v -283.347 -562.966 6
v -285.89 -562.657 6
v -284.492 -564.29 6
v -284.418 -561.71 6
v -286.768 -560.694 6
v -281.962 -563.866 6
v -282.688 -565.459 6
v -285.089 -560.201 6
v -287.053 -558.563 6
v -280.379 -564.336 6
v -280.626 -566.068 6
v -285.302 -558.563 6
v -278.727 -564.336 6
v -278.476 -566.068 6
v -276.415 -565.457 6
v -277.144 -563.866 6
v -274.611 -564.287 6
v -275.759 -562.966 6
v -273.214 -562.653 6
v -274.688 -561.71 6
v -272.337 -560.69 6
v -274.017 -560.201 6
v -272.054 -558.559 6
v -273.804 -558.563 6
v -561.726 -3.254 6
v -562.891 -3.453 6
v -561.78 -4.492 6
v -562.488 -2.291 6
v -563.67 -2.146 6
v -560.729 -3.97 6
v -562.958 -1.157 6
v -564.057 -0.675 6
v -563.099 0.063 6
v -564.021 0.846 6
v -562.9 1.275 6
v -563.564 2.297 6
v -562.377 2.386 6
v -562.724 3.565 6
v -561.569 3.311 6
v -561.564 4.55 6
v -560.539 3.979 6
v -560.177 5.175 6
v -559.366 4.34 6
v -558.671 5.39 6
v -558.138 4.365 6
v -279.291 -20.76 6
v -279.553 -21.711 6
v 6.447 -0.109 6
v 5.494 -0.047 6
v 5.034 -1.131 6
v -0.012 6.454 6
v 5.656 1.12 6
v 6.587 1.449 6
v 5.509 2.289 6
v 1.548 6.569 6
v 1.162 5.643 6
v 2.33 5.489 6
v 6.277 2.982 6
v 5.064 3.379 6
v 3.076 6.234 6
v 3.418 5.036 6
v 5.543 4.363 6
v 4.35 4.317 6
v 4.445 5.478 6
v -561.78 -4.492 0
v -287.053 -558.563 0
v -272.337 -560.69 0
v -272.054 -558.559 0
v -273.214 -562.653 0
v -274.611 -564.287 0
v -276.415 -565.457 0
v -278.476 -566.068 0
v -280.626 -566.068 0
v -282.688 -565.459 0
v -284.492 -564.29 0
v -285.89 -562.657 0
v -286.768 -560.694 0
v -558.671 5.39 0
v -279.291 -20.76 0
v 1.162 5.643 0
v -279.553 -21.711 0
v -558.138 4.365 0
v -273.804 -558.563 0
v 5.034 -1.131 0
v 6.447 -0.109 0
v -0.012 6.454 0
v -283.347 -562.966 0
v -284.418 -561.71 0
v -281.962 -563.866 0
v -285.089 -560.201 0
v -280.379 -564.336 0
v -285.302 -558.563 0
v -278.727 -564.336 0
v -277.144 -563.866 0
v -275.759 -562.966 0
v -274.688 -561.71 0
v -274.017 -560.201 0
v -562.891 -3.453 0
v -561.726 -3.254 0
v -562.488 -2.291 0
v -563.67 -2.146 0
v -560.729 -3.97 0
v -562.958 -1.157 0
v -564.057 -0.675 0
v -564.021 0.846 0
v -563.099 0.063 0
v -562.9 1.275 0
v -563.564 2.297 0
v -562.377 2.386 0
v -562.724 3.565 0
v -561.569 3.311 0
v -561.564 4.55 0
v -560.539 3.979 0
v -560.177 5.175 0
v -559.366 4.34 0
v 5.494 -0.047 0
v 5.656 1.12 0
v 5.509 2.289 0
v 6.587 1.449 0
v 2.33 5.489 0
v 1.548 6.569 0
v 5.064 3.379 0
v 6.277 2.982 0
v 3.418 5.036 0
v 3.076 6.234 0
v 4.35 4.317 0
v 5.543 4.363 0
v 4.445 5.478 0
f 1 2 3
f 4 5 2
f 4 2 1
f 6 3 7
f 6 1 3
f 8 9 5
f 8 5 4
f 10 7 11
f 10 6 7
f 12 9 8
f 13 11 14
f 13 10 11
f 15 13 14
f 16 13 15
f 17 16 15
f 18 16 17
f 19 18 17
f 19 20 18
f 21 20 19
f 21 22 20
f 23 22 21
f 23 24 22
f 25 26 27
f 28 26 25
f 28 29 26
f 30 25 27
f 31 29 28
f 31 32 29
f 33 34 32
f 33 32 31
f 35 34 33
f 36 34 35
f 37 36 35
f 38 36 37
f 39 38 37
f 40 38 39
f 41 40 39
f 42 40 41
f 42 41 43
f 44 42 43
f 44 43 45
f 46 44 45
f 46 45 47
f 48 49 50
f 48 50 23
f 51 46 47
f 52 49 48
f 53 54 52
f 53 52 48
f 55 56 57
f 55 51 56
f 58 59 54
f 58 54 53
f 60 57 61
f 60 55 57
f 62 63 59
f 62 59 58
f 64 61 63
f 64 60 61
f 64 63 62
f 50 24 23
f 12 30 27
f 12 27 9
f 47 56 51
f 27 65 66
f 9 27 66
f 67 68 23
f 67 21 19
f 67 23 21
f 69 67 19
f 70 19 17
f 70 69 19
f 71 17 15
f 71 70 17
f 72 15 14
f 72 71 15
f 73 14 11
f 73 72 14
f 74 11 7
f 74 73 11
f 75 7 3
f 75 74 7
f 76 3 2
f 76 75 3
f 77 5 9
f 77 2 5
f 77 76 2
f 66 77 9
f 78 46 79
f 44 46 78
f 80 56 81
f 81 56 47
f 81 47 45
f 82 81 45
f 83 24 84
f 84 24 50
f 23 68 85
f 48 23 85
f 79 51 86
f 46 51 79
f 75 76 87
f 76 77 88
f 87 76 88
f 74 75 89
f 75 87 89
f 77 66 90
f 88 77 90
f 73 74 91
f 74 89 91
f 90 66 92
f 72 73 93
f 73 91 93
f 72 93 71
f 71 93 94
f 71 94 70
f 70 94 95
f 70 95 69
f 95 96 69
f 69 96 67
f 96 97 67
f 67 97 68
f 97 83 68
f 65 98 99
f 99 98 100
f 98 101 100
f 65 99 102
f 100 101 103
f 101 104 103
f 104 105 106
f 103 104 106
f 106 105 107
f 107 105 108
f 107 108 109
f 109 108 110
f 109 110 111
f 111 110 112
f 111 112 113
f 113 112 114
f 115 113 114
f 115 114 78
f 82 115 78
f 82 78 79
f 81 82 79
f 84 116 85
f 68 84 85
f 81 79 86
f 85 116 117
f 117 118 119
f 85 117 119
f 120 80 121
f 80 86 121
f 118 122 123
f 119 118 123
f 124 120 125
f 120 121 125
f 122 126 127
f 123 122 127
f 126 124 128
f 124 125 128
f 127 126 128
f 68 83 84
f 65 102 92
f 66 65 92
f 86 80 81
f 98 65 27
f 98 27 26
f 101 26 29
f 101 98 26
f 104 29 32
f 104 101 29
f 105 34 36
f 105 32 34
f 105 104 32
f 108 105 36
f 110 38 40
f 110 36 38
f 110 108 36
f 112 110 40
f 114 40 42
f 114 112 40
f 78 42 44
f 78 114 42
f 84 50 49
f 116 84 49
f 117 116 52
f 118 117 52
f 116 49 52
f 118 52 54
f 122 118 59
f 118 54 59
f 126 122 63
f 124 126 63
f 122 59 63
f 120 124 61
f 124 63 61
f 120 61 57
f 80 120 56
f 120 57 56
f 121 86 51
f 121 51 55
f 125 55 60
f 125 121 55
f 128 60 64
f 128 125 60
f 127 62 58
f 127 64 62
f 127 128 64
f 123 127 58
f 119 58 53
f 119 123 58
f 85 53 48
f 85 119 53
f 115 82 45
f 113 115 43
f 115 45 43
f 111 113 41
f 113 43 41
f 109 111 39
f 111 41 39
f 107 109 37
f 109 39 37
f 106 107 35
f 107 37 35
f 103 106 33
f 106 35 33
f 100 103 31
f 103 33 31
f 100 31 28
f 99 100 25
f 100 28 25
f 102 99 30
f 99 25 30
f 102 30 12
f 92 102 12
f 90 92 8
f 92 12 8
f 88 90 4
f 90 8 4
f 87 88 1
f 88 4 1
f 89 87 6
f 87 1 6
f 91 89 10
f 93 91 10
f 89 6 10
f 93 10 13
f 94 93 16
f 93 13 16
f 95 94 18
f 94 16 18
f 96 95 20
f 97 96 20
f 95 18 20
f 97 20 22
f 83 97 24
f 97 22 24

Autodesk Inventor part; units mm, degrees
ref_plane "YZ Plane" through (0, 0, 0) normal (1, 0, 0) x (0, 1, 0)
ref_plane "XZ Plane" through (0, 0, 0) normal (0, 1, 0) x (-1, 0, 0)
ref_plane "XY Plane" through (0, 0, 0) normal (0, 0, 1) x (1, 0, 0)
sketch "Sketch1" plane through (0, 0, 0) normal (0, 0, 1) x (1, 0, 0)
  arc A0 (-287.0527, -558.563) -> (-272.0536, -558.5587) centre (-279.5531, -558.6452) ccw
  line L0 (-561.7795, -4.4916) -> (-287.0527, -558.563)
  line L1 (-272.0536, -558.5587) -> (6.4474, -0.1094)
  line L2 (-0.0123, 6.4539) -> (-558.6713, 5.3904)
  arc A1 (-558.6713, 5.3904) -> (-561.7795, -4.4916) centre (-558.6609, -0.0427) ccw
  arc A2 (6.4474, -0.1094) -> (-0.0123, 6.4539) centre (1.1622, 1.1493) ccw
  point P0 (0, 0)
  dimension "d0" = 5.433
extrude "Extrusion1" add sketch "Sketch1" along normal blind 6
sketch "Sketch3" plane through (0, 0, 6) normal (0, 0, 1) x (1, 0, 0)
  line L0 (-561.7795, -4.4916) -> (-287.0527, -558.563) projected
  arc A0 (-287.0527, -558.563) -> (-272.0536, -558.5587) centre (-279.5531, -558.6452) ccw projected
  line L1 (-272.0536, -558.5587) -> (6.4474, -0.1094) projected
  arc A1 (6.4474, -0.1094) -> (-0.0123, 6.4539) centre (1.1622, 1.1493) ccw projected
  line L2 (-0.0123, 6.4539) -> (-558.6713, 5.3904) projected
  arc A2 (-558.6713, 5.3904) -> (-561.7795, -4.4916) centre (-558.6609, -0.0427) ccw projected
  line L3 (-0.0123, 6.4539) -> (-279.291, -20.76)
  line L4 (-0.0123, 6.4539) -> (-558.6713, 5.3904) projected
  line L5 (-279.291, -20.76) -> (-558.6713, 5.3904)
  line L6 (-558.6713, 5.3904) -> (-279.551, 142.5192)
  line L7 (-279.551, 142.5192) -> (-0.0123, 6.4539)
  point P0 (0, 0)
extrude "Extrusion2" cut sketch "Sketch3" against normal blind 6 contours L6 L7 L2 | L2 L3 L5
sketch "Sketch4" plane through (0, 0, 6) normal (0, 0, 1) x (1, 0, 0)
  point P0 (0, 0)
sketch "Sketch5" plane through (0, 0, 6) normal (0, 0, 1) x (1, 0, 0)
  line L0 (-0.0123, 6.4539) -> (-279.291, -20.76) projected
  line L1 (-279.291, -20.76) -> (-558.6713, 5.3904) projected
  arc A0 (-558.6713, 5.3904) -> (-561.7795, -4.4916) centre (-558.6609, -0.0427) ccw projected
  line L2 (-561.7795, -4.4916) -> (-287.0527, -558.563) projected
  arc A1 (-287.0527, -558.563) -> (-272.0536, -558.5587) centre (-279.5531, -558.6452) ccw projected
  line L3 (-272.0536, -558.5587) -> (6.4474, -0.1094) projected
  arc A2 (6.4474, -0.1094) -> (-0.0123, 6.4539) centre (1.1622, 1.1493) ccw projected
  arc A3 (-285.3025, -558.563) -> (-273.8037, -558.563) centre (-279.5531, -558.6452) ccw
  arc A4 (5.0344, -1.1313) -> (0.2947, 5.5587) centre (1.1622, 1.1493) ccw
  arc A5 (-558.1379, 4.3653) -> (-560.7286, -3.9705) centre (-558.6609, -0.0427) ccw
  line L4 (-560.7286, -3.9705) -> (-285.3025, -558.563)
  line L5 (-273.8037, -558.563) -> (5.0344, -1.1313)
  line L6 (1.1622, 5.6432) -> (-279.5531, -21.7107)
  line L7 (-279.5531, -21.7107) -> (-558.1379, 4.3653)
  point P0 (0, 0)
  dimension "d5" = 11.5
extrude "Extrusion3" cut sketch "Sketch5" against normal blind 6 contours L4 A5 L7 L6 A4 L5 A3
properties part number "z bELT"
